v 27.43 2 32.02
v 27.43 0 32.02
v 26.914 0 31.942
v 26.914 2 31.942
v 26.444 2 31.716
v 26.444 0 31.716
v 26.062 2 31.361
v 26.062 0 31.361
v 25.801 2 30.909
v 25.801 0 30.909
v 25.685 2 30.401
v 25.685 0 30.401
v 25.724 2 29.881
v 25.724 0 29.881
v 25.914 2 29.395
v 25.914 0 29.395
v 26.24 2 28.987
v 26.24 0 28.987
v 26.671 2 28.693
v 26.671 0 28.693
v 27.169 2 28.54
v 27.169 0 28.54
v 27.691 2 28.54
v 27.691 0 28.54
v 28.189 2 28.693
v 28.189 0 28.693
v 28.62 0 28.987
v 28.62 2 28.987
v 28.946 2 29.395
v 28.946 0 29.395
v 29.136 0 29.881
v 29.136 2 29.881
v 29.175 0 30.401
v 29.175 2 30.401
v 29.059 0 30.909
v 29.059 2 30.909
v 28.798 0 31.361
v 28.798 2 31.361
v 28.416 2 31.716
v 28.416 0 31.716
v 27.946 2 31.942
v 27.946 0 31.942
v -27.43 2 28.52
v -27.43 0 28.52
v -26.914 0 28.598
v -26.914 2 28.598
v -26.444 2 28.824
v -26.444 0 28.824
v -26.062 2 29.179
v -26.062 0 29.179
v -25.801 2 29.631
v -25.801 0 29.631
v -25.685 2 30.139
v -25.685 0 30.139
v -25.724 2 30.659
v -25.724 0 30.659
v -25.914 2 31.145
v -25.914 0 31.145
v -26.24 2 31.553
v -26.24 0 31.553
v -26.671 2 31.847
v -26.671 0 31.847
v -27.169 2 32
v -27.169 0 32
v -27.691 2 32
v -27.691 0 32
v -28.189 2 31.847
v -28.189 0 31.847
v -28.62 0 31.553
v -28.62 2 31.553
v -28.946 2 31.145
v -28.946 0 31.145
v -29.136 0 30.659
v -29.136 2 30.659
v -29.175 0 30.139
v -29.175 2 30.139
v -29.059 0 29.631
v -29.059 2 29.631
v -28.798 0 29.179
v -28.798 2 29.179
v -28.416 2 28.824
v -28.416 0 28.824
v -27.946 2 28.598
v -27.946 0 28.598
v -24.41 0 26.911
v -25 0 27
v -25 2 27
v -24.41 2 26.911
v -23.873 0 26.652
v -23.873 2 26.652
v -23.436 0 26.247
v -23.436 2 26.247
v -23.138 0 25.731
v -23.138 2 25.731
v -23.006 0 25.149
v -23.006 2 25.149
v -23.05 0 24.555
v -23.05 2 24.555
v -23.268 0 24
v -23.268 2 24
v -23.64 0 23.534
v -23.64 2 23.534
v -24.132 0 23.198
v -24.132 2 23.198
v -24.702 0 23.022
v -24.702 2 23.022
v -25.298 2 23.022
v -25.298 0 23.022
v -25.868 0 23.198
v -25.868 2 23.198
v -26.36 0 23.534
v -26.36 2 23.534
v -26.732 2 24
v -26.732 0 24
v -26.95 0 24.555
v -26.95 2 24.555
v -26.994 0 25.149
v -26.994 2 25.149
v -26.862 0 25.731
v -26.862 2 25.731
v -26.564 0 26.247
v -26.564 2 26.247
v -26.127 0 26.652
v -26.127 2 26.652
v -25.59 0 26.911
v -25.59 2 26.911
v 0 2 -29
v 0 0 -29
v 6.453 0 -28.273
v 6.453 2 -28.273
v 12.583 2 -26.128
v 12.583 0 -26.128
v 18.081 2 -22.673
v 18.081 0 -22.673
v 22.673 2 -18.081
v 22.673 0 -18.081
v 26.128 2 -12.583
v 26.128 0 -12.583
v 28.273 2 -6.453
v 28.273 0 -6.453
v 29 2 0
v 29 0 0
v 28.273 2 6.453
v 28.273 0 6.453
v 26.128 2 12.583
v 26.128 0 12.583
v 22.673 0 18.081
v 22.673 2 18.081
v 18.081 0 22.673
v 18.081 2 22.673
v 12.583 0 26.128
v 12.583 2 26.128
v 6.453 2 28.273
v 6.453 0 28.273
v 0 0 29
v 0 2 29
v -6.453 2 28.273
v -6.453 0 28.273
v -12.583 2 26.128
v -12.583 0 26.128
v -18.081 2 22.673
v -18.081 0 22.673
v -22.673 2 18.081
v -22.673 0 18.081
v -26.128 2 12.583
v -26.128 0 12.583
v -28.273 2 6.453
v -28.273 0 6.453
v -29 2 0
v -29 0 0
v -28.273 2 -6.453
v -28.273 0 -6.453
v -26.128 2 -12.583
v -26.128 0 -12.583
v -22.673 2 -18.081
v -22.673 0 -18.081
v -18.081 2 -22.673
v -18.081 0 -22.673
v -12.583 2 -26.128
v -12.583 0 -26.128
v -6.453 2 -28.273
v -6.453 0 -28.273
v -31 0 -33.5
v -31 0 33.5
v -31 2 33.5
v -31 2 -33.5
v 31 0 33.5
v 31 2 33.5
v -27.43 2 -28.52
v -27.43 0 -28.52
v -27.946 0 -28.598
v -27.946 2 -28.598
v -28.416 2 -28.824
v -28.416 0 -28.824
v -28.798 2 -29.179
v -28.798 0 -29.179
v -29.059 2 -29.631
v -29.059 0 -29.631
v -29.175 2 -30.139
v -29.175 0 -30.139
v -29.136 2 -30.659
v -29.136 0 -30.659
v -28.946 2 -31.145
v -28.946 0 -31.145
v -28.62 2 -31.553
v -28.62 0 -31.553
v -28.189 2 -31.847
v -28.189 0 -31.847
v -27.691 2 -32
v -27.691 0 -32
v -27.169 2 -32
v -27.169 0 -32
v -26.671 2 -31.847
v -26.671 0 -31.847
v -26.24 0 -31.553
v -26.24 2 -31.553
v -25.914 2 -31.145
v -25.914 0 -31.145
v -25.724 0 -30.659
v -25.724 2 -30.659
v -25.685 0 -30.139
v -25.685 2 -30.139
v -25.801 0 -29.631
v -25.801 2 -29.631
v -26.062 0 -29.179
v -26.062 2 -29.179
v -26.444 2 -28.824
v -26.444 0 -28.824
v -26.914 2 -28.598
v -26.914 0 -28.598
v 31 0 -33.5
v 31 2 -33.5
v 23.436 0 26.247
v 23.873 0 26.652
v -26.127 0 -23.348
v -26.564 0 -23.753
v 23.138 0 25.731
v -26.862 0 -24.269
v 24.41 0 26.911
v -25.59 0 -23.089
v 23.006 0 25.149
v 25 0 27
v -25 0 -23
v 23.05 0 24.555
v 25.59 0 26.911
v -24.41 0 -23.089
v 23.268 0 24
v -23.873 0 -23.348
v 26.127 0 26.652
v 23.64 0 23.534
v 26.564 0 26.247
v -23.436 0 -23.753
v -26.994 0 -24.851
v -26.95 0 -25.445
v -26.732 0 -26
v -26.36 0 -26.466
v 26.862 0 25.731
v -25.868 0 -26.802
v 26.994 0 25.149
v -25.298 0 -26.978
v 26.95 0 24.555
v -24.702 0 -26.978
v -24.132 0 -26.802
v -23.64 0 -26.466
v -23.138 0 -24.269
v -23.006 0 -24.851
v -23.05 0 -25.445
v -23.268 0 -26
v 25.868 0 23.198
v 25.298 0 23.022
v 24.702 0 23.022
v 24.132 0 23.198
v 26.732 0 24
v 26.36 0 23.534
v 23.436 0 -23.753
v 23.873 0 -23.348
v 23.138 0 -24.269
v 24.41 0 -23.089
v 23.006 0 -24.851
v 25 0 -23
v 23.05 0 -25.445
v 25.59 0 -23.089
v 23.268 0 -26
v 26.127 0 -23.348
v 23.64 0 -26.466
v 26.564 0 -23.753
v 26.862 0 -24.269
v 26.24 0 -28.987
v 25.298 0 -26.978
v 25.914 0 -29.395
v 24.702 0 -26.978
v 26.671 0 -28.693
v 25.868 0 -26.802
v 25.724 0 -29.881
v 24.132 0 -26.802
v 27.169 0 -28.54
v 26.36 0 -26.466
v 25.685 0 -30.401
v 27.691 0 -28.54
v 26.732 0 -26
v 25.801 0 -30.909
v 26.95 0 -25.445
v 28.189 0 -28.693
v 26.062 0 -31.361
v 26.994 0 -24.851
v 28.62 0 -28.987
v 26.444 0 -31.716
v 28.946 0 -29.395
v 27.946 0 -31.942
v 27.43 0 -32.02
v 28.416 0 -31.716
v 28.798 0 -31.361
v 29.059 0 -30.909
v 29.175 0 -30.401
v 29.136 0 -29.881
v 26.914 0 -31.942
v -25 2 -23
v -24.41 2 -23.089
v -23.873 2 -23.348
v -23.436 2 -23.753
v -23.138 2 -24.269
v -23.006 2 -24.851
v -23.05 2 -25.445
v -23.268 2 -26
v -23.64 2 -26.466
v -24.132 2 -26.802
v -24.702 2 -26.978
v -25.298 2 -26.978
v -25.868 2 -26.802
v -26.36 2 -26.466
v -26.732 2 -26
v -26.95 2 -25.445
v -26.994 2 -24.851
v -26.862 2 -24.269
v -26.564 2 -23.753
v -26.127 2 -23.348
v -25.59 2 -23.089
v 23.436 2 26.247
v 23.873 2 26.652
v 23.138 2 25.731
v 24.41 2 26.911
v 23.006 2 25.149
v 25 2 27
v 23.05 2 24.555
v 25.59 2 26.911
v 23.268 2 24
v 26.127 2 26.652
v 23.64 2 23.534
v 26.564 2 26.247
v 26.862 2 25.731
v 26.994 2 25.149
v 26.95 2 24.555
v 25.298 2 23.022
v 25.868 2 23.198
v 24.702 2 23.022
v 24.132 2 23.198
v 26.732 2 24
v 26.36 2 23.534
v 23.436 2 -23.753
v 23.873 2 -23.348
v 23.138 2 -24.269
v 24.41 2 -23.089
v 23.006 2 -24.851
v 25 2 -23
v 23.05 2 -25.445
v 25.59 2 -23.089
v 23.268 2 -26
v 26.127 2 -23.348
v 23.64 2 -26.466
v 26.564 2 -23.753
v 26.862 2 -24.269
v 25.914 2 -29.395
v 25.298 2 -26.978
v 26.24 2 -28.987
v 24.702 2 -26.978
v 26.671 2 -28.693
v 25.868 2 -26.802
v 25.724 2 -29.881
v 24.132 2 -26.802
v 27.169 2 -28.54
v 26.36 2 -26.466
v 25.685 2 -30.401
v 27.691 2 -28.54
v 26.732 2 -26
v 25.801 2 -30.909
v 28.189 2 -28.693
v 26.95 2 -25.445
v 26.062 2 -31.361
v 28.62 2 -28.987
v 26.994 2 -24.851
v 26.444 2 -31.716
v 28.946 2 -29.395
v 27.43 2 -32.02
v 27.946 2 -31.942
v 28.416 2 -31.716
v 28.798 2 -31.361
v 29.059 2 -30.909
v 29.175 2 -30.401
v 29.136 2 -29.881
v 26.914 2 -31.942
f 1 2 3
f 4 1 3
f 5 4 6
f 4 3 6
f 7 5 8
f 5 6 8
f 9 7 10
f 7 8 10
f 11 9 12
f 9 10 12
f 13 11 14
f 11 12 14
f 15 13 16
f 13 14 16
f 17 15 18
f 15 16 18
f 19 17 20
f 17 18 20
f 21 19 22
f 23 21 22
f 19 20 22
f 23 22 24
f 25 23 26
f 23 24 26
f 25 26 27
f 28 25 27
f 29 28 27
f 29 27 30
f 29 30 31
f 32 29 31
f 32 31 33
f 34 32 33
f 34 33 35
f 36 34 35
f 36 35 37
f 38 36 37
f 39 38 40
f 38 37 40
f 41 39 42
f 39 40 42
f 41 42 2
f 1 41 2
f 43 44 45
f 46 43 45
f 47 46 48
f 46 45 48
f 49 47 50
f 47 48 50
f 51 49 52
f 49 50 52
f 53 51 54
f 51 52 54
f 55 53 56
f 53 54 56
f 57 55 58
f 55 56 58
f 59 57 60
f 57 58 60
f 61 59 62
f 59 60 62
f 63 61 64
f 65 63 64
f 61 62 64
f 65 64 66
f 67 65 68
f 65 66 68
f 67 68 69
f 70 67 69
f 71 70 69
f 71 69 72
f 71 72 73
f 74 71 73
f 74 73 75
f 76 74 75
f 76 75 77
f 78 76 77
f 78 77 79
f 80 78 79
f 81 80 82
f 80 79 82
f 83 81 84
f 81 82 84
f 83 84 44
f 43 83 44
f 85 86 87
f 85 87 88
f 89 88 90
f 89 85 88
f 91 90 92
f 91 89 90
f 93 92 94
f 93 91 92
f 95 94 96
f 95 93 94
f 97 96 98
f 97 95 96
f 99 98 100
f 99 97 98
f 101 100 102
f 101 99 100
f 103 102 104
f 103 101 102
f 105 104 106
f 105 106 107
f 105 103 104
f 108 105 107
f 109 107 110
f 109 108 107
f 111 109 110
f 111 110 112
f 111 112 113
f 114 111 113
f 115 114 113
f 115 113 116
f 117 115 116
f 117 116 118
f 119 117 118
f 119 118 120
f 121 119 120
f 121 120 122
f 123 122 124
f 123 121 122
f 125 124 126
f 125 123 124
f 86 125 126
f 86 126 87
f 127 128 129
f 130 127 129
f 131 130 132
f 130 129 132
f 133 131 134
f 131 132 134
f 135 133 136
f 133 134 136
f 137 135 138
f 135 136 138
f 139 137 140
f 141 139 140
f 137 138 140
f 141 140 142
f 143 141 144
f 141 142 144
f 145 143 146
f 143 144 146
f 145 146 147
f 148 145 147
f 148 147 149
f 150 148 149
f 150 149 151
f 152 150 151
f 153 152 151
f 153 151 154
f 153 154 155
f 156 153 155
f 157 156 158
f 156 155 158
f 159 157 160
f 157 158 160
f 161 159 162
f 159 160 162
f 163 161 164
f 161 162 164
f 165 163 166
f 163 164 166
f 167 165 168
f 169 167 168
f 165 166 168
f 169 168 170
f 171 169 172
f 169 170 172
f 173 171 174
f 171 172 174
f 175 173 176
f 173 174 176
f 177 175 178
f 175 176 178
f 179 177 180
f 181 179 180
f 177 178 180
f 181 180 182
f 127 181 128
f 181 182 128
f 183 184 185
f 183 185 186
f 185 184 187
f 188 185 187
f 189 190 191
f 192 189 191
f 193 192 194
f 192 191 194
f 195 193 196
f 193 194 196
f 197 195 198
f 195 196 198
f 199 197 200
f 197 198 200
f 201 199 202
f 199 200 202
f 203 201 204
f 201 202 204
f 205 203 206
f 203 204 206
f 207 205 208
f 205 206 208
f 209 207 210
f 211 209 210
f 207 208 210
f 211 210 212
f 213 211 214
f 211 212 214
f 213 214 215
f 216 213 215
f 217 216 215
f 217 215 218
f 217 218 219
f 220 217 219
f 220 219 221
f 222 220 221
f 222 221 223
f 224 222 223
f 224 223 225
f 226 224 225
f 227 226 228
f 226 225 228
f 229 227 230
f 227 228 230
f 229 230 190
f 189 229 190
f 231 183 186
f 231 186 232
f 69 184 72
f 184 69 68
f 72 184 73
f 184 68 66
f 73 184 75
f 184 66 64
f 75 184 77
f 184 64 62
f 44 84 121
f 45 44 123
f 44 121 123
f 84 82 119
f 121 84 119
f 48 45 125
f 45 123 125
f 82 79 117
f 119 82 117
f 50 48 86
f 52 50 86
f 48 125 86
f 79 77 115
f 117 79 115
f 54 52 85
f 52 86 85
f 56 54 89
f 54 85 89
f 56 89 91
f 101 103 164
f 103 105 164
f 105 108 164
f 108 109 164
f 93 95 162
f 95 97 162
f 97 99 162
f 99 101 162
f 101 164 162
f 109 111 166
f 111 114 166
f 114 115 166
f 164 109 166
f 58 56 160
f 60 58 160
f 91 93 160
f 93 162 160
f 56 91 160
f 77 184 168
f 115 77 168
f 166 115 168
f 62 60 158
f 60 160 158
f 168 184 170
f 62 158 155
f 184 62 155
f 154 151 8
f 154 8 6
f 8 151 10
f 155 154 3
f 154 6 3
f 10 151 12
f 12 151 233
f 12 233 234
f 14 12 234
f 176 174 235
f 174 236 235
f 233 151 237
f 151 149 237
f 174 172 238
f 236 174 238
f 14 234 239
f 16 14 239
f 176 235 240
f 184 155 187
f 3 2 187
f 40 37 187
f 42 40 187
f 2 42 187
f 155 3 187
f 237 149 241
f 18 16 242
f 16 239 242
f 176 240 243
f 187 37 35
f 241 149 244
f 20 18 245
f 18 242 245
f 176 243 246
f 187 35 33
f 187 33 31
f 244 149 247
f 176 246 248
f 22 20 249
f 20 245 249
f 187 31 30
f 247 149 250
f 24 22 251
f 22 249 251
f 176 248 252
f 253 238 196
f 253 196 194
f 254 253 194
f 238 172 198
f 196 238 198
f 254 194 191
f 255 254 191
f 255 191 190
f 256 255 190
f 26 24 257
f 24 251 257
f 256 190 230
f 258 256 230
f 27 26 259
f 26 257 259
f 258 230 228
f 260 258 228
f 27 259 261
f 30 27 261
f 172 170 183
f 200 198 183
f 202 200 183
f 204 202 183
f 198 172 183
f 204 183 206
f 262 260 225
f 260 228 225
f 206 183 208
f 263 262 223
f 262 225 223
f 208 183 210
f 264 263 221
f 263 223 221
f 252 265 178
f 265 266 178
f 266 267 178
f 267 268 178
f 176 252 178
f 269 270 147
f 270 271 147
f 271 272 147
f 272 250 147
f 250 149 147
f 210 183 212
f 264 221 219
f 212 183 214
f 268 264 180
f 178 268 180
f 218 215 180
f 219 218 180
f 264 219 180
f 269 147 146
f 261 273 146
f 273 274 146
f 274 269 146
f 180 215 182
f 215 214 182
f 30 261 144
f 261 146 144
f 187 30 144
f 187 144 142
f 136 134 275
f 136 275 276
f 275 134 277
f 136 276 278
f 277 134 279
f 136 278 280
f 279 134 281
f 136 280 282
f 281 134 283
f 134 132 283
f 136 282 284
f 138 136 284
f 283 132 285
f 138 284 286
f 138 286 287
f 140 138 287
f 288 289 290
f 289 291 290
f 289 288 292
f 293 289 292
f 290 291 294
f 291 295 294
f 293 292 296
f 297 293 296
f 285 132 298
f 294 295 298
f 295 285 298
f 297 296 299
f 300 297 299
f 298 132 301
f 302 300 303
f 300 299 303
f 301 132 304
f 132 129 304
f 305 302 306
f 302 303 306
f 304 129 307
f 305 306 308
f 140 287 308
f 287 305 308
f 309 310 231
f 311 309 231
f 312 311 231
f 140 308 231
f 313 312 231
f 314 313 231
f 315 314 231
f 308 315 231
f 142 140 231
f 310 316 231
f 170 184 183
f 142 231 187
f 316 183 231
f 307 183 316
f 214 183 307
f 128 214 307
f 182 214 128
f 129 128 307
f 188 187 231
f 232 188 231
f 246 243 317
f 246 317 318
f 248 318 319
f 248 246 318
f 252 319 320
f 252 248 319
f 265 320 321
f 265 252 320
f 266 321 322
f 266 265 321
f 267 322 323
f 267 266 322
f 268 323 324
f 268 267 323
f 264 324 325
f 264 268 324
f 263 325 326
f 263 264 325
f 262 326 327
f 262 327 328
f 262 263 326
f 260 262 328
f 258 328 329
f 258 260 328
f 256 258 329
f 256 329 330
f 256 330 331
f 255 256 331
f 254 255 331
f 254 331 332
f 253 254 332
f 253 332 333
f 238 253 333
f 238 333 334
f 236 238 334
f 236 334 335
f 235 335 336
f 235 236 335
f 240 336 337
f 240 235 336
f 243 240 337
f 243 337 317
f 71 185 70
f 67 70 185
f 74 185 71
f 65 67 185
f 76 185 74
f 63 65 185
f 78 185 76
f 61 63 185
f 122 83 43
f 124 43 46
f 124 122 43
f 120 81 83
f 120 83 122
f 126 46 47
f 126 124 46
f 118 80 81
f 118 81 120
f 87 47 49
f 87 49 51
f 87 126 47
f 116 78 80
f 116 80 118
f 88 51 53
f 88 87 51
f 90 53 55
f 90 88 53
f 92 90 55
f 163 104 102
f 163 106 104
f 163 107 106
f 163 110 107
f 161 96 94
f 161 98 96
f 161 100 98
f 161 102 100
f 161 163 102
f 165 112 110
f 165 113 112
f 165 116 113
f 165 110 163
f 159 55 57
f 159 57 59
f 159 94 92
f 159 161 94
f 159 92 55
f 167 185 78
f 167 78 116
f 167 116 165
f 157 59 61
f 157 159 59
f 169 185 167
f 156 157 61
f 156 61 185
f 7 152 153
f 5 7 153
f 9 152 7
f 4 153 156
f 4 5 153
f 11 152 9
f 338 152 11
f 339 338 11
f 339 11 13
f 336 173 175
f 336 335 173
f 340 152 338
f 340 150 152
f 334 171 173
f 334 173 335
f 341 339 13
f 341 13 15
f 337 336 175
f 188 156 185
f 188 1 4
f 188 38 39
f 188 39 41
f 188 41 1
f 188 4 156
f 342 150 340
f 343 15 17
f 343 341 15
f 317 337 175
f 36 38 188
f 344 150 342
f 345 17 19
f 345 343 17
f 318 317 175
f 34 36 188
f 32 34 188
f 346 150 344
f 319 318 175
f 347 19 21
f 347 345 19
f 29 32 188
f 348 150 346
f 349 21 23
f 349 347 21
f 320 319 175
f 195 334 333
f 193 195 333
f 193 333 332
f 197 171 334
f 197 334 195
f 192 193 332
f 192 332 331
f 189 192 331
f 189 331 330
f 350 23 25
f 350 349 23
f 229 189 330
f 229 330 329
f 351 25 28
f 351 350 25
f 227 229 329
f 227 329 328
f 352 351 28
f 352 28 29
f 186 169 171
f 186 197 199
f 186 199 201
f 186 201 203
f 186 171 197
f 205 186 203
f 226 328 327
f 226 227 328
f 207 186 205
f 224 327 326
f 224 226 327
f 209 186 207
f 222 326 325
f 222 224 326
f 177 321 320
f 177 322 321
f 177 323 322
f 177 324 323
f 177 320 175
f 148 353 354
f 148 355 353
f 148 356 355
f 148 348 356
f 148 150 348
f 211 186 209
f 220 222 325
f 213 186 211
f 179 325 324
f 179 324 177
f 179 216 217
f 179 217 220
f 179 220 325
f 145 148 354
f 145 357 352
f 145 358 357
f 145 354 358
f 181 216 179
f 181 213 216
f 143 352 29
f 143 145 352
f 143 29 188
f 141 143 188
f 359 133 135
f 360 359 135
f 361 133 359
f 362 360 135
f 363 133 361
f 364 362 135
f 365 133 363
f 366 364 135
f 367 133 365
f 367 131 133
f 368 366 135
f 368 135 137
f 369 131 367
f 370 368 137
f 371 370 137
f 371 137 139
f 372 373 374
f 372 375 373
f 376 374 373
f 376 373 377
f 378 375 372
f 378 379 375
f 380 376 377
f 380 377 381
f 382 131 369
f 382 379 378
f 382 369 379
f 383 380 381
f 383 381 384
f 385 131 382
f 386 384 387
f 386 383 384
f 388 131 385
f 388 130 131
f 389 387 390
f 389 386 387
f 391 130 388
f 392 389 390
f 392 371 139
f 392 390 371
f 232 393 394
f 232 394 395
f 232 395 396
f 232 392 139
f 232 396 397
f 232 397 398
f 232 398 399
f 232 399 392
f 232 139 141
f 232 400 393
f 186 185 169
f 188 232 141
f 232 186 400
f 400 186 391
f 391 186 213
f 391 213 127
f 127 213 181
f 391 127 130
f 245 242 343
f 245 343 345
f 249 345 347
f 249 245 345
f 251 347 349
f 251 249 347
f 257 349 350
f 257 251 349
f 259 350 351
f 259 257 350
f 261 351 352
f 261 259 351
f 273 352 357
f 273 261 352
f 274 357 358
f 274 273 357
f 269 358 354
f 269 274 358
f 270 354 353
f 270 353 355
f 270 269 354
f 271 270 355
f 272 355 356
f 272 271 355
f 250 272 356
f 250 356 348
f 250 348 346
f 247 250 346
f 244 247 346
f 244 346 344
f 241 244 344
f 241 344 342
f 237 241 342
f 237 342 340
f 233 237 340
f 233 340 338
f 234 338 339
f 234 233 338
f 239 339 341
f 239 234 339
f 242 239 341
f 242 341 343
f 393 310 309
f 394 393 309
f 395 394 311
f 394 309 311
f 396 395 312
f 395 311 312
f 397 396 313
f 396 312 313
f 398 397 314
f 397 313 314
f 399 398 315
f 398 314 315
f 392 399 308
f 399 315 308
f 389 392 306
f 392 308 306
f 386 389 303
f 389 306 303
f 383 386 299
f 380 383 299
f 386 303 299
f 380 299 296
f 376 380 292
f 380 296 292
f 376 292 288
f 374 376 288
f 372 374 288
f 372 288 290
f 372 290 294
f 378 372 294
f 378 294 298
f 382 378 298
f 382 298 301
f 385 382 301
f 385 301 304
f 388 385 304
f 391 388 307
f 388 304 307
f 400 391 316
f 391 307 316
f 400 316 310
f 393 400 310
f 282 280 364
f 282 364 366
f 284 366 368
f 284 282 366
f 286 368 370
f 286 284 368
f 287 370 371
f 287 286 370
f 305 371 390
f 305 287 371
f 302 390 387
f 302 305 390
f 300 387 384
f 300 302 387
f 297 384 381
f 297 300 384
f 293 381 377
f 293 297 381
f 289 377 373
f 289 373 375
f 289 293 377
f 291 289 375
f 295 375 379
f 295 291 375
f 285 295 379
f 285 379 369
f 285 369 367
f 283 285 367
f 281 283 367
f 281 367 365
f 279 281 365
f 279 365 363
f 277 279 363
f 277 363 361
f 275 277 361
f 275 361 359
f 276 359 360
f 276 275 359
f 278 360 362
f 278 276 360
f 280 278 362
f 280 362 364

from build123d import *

# Parameters (mm, degrees)
SKETCH_1_W          = 62
SKETCH_1_H          = 67
SKETCH_1_R          = 2
EXTRUDE_1_DEPTH     = 2
SKETCH_4_R          = 29
CUT_EXTRUDE_2_DEPTH = 2
SKETCH_5_R          = 1.75
CUT_EXTRUDE_3_DEPTH = 2


with BuildPart() as part:
    # Эскиз1 → Бобышка-Вытянуть1 (new body)
    with BuildSketch(Plane(origin=(0, 0, 0), x_dir=(1, 0, 0), z_dir=(0, 1, 0))):
        Rectangle(SKETCH_1_W, SKETCH_1_H)
        with Locations(Location((25, 25, 0), (0, 0, 270))):
            Circle(SKETCH_1_R, mode=Mode.SUBTRACT)
        with Locations(Location((-25, 25, 0), (0, 0, 270))):
            Circle(SKETCH_1_R, mode=Mode.SUBTRACT)
        with Locations(Location((25, -25, 0), (0, 0, 270))):
            Circle(SKETCH_1_R, mode=Mode.SUBTRACT)
        with Locations(Location((-25, -25, 0), (0, 0, 270))):
            Circle(SKETCH_1_R, mode=Mode.SUBTRACT)
    extrude(amount=EXTRUDE_1_DEPTH)

    # Эскиз4 → Вырез-Вытянуть2 (cut)
    with BuildSketch(Plane.XZ):
        with Locations(Location((0, 0, 0), (0, 0, 270))):
            Circle(SKETCH_4_R)
    extrude(amount=-CUT_EXTRUDE_2_DEPTH, mode=Mode.SUBTRACT)

    # Эскиз5 → Вырез-Вытянуть3 (cut)
    with BuildSketch(Plane.XZ):
        with Locations(Location((-27.43, 30.27, 0), (0, 0, 270))):
            Circle(SKETCH_5_R)
        with Locations(Location((-27.43, -30.27, 0), (0, 0, 90))):
            Circle(SKETCH_5_R)
        with Locations(Location((27.43, -30.27, 0), (0, 0, 270))):
            Circle(SKETCH_5_R)
        with Locations(Location((27.43, 30.27, 0), (0, 0, 90))):
            Circle(SKETCH_5_R)
    extrude(amount=-CUT_EXTRUDE_3_DEPTH, mode=Mode.SUBTRACT)


solid = part.part
